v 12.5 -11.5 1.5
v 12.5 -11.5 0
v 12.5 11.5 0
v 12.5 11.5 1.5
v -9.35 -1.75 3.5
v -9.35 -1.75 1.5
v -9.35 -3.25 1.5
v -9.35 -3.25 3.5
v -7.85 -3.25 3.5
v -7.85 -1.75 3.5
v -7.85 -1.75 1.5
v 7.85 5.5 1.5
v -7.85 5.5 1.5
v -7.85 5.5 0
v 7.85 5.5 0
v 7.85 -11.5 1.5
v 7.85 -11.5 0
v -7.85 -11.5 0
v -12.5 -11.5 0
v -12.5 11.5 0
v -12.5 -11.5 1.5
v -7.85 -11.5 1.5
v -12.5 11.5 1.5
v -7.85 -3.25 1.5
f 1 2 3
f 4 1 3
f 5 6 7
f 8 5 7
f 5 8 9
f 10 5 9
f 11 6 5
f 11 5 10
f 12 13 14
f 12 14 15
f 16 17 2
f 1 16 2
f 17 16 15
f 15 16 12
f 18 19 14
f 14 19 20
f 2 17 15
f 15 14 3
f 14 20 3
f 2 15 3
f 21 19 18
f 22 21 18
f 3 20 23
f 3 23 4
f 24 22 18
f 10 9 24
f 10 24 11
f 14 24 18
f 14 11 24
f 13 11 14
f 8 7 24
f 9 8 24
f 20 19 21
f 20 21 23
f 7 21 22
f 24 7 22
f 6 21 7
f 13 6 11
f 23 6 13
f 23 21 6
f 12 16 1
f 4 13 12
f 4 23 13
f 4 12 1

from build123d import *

# Parameters (mm, degrees)
SKETCH_W     = 25
SKETCH_H     = 23
PAD_DEPTH    = 1.5
SKETCH001_W  = 15.7
SKETCH001_H  = 17
POCKET_DEPTH = 5
SKETCH002_W  = 1.5
SKETCH002_H  = 1.5
PAD001_DEPTH = 2


with BuildPart() as part:
    # Sketch → Pad (new body)
    with BuildSketch(Plane.XY):
        Rectangle(SKETCH_W, SKETCH_H)
    extrude(amount=PAD_DEPTH)

    # Sketch001 (on Face6 of Pad) → Pocket (cut)
    with BuildSketch(Plane.XY.offset(1.5)):
        with Locations((0, -3)):
            Rectangle(SKETCH001_W, SKETCH001_H)
    extrude(amount=-POCKET_DEPTH, mode=Mode.SUBTRACT)

    # Sketch002 (on Face4 of Pocket) → Pad001 (join)
    with BuildSketch(Plane(origin=(0, 0, 1.5), x_dir=(1, 0, 0), z_dir=(0, 0, -1))):
        with Locations((-8.6, 2.5)):
            Rectangle(SKETCH002_W, SKETCH002_H)
    extrude(amount=-PAD001_DEPTH)


solid = part.part
